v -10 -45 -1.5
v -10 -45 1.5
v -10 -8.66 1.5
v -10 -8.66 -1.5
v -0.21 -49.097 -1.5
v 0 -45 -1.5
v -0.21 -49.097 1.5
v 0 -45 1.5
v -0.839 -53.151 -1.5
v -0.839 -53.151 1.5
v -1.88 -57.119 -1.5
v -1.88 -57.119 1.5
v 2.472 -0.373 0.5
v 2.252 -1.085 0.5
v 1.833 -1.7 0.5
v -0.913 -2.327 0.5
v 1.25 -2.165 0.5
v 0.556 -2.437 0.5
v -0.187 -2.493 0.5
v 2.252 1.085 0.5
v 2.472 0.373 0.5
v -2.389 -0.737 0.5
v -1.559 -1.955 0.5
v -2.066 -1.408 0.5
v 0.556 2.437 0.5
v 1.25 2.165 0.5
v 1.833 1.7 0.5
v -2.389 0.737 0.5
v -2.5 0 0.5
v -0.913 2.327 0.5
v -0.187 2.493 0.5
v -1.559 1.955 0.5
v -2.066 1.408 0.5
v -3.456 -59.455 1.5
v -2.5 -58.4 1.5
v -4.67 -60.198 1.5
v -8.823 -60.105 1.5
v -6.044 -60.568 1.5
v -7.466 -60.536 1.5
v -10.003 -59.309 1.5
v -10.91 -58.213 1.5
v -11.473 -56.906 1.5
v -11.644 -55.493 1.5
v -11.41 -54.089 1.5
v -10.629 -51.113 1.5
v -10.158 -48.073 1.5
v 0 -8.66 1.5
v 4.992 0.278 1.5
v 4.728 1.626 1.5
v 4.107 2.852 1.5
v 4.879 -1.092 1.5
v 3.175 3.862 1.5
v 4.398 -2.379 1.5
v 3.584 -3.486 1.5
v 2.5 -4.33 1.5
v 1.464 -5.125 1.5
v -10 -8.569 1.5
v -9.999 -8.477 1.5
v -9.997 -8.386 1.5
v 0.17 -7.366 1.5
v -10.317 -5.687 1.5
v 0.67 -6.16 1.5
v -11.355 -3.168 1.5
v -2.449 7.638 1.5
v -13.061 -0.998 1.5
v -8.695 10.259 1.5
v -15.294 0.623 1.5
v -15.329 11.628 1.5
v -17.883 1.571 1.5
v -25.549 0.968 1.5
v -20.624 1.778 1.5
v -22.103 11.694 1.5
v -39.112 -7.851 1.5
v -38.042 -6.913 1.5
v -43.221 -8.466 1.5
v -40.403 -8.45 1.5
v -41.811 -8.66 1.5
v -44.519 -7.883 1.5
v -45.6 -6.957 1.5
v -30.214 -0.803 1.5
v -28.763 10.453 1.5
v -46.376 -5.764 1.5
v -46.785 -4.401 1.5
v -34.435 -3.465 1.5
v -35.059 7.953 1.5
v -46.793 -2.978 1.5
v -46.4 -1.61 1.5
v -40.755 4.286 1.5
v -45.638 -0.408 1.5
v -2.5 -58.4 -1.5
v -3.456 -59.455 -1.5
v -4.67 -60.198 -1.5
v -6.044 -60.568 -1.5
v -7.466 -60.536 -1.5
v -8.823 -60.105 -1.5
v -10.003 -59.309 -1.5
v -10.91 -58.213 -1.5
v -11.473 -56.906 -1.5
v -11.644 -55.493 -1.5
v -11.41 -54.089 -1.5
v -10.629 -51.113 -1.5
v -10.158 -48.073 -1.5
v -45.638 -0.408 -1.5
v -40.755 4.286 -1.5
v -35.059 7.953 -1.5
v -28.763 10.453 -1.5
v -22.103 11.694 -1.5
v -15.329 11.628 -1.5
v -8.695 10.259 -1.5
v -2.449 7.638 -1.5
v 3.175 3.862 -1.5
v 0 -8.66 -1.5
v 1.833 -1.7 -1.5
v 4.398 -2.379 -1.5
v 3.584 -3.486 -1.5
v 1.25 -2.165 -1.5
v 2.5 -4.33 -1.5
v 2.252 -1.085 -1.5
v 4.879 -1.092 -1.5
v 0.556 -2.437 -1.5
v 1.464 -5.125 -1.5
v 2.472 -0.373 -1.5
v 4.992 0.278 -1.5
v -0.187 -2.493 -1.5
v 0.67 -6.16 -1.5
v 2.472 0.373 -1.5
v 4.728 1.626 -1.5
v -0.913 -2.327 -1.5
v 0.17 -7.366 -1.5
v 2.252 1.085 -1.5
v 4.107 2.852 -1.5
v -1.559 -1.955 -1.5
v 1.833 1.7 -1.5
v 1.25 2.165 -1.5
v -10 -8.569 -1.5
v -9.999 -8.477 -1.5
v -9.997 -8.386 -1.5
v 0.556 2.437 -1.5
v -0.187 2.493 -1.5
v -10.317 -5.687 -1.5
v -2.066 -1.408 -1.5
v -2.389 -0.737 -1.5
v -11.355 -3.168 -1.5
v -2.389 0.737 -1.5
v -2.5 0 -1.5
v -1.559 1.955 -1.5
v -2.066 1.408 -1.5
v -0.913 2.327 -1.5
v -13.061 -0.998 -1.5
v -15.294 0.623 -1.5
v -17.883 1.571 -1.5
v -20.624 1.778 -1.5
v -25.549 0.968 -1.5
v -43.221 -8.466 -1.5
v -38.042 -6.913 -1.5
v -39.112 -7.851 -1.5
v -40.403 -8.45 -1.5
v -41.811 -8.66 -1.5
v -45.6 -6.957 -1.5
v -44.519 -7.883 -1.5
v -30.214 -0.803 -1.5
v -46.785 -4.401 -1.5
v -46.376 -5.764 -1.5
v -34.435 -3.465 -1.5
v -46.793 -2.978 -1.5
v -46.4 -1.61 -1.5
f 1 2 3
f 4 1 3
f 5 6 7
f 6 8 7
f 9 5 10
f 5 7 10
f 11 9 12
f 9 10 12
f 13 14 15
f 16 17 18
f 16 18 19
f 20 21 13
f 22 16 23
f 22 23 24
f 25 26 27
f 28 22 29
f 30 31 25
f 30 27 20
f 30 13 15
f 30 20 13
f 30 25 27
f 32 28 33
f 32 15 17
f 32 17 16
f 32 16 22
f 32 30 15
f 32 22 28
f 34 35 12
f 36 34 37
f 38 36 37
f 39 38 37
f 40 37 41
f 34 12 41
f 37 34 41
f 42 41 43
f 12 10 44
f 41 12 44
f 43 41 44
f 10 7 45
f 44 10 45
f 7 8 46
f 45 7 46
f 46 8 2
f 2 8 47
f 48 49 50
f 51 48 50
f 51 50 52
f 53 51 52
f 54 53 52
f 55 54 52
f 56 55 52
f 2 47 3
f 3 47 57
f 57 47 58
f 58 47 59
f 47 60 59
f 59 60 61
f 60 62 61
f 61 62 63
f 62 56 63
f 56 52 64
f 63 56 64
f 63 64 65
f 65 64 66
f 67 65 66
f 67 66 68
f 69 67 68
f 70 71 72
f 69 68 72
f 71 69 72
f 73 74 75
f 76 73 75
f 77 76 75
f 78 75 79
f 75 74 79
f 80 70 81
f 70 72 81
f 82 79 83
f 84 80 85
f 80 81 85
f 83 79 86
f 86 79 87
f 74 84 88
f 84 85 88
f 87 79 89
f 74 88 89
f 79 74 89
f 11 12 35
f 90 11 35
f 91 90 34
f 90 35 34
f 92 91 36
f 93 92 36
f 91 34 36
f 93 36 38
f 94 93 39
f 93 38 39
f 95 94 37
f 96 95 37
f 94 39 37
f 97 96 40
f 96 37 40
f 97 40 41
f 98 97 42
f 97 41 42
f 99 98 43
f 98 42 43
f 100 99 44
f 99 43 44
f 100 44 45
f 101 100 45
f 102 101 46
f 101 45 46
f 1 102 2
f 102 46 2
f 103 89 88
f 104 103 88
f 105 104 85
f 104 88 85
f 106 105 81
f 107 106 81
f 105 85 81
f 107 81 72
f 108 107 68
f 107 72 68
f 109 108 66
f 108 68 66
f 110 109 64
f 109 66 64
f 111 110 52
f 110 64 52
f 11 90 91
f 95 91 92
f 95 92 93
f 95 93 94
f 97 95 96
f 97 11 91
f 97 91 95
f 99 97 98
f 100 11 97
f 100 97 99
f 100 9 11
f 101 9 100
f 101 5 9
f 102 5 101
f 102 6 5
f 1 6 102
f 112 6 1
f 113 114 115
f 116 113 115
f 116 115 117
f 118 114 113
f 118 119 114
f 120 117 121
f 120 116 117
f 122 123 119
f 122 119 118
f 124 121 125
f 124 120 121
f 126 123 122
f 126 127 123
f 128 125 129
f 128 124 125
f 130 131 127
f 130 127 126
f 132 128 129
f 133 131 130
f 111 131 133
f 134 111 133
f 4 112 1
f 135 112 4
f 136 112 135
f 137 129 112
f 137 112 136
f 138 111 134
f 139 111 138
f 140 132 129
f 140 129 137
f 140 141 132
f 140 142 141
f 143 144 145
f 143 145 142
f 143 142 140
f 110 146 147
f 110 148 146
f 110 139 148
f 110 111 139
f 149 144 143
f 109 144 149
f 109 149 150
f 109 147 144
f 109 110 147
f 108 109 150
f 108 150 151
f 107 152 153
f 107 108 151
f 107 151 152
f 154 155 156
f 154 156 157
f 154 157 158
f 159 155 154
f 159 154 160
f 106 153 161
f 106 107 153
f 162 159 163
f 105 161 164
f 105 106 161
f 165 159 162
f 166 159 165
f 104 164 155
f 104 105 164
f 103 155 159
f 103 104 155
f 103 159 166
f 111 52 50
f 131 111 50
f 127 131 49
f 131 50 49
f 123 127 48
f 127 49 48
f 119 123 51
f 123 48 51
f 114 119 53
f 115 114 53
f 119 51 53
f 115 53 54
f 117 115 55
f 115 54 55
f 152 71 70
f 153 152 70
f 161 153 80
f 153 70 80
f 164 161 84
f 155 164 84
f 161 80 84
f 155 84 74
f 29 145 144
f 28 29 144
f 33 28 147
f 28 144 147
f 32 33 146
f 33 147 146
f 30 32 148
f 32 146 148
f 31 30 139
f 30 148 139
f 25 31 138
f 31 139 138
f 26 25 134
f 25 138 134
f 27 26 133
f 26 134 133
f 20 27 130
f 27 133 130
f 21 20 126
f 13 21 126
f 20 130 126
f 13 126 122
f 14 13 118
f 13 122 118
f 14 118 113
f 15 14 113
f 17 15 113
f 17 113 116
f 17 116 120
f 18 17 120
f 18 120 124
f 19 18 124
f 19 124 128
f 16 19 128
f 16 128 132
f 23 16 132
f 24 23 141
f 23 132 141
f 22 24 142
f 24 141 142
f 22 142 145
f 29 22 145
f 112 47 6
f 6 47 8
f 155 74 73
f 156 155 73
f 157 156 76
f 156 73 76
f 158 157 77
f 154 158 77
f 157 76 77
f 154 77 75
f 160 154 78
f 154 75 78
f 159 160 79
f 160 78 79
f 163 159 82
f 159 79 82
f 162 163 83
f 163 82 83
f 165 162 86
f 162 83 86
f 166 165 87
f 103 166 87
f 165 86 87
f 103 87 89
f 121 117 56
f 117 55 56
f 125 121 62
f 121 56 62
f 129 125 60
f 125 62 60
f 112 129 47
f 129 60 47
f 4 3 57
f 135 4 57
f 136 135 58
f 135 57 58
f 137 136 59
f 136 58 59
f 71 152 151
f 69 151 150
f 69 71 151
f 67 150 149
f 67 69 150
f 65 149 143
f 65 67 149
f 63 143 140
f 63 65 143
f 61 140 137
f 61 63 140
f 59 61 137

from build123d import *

# Parameters (mm, degrees)
BOSS_EXTRU_1_DEPTH      = 1.5
BOSS_EXTRU_2_DEPTH      = 3
ESQUISSE2_R             = 2.5
ENL_V_MAT_EXTRU_3_DEPTH = 2
CONG_1_R                = 10


with BuildPart() as part:
    # Esquisse1 → Boss.-Extru.1 (new body, symmetric)
    with BuildSketch(Plane.XY):
        with BuildLine():
            Line((-10, -45), (-10, -8.660254038))
            ThreePointArc((-10, -8.660254038), (-7.990381057, -1.160254038), (-2.5, 4.330127019))
            ThreePointArc((-2.5, 4.330127019), (4.330127019, 2.5), (2.5, -4.330127019))
            ThreePointArc((2.5, -4.330127019), (0.669872981, -6.160254038), (0, -8.660254038))
            Line((0, -8.660254038), (0, -45))
            ThreePointArc((0, -45), (-0.472828873, -51.132107527), (-1.880137136, -57.11924318))
            ThreePointArc((-1.880137136, -57.11924318), (-8.160025392, -60.369320641), (-11.410102852, -54.089432385))
            ThreePointArc((-11.410102852, -54.089432385), (-10.354621655, -49.599080646), (-10, -45))
        make_face()
    extrude(amount=BOSS_EXTRU_1_DEPTH, both=True)

    # Esquisse4 → Boss.-Extru.2 (add)
    with BuildSketch(Plane.XY.offset(1.5)):
        with BuildLine():
            ThreePointArc((-38.042287627, -6.912622664), (-45.092258789, -7.458430888), (-45.638067013, -0.408459726))
            ThreePointArc((-45.638067013, -0.408459726), (-22.103290159, 11.693784424), (3.175473194, 3.862171668))
            ThreePointArc((3.175473194, 3.862171668), (3.862171668, -3.175473194), (-3.175473194, -3.862171668))
            ThreePointArc((-3.175473194, -3.862171668), (-21.231732732, 1.731837443), (-38.042287627, -6.912622664))
        make_face()
    extrude(amount=-BOSS_EXTRU_2_DEPTH)

    # Esquisse2 → Enlèv. mat.-Extru.3 (cut)
    with BuildSketch(Plane(origin=(0, 0, -1.5), x_dir=(-1, 0, 0), z_dir=(0, 0, -1))):
        Circle(ESQUISSE2_R)
    extrude(amount=-ENL_V_MAT_EXTRU_3_DEPTH, mode=Mode.SUBTRACT)

    # Congé1
    cong_1_edges = [part.edges().sort_by_distance(p)[0] for p in [
        (-7.8041925, -0.846634236, 0),
    ]]
    fillet(cong_1_edges, radius=CONG_1_R)


solid = part.part
